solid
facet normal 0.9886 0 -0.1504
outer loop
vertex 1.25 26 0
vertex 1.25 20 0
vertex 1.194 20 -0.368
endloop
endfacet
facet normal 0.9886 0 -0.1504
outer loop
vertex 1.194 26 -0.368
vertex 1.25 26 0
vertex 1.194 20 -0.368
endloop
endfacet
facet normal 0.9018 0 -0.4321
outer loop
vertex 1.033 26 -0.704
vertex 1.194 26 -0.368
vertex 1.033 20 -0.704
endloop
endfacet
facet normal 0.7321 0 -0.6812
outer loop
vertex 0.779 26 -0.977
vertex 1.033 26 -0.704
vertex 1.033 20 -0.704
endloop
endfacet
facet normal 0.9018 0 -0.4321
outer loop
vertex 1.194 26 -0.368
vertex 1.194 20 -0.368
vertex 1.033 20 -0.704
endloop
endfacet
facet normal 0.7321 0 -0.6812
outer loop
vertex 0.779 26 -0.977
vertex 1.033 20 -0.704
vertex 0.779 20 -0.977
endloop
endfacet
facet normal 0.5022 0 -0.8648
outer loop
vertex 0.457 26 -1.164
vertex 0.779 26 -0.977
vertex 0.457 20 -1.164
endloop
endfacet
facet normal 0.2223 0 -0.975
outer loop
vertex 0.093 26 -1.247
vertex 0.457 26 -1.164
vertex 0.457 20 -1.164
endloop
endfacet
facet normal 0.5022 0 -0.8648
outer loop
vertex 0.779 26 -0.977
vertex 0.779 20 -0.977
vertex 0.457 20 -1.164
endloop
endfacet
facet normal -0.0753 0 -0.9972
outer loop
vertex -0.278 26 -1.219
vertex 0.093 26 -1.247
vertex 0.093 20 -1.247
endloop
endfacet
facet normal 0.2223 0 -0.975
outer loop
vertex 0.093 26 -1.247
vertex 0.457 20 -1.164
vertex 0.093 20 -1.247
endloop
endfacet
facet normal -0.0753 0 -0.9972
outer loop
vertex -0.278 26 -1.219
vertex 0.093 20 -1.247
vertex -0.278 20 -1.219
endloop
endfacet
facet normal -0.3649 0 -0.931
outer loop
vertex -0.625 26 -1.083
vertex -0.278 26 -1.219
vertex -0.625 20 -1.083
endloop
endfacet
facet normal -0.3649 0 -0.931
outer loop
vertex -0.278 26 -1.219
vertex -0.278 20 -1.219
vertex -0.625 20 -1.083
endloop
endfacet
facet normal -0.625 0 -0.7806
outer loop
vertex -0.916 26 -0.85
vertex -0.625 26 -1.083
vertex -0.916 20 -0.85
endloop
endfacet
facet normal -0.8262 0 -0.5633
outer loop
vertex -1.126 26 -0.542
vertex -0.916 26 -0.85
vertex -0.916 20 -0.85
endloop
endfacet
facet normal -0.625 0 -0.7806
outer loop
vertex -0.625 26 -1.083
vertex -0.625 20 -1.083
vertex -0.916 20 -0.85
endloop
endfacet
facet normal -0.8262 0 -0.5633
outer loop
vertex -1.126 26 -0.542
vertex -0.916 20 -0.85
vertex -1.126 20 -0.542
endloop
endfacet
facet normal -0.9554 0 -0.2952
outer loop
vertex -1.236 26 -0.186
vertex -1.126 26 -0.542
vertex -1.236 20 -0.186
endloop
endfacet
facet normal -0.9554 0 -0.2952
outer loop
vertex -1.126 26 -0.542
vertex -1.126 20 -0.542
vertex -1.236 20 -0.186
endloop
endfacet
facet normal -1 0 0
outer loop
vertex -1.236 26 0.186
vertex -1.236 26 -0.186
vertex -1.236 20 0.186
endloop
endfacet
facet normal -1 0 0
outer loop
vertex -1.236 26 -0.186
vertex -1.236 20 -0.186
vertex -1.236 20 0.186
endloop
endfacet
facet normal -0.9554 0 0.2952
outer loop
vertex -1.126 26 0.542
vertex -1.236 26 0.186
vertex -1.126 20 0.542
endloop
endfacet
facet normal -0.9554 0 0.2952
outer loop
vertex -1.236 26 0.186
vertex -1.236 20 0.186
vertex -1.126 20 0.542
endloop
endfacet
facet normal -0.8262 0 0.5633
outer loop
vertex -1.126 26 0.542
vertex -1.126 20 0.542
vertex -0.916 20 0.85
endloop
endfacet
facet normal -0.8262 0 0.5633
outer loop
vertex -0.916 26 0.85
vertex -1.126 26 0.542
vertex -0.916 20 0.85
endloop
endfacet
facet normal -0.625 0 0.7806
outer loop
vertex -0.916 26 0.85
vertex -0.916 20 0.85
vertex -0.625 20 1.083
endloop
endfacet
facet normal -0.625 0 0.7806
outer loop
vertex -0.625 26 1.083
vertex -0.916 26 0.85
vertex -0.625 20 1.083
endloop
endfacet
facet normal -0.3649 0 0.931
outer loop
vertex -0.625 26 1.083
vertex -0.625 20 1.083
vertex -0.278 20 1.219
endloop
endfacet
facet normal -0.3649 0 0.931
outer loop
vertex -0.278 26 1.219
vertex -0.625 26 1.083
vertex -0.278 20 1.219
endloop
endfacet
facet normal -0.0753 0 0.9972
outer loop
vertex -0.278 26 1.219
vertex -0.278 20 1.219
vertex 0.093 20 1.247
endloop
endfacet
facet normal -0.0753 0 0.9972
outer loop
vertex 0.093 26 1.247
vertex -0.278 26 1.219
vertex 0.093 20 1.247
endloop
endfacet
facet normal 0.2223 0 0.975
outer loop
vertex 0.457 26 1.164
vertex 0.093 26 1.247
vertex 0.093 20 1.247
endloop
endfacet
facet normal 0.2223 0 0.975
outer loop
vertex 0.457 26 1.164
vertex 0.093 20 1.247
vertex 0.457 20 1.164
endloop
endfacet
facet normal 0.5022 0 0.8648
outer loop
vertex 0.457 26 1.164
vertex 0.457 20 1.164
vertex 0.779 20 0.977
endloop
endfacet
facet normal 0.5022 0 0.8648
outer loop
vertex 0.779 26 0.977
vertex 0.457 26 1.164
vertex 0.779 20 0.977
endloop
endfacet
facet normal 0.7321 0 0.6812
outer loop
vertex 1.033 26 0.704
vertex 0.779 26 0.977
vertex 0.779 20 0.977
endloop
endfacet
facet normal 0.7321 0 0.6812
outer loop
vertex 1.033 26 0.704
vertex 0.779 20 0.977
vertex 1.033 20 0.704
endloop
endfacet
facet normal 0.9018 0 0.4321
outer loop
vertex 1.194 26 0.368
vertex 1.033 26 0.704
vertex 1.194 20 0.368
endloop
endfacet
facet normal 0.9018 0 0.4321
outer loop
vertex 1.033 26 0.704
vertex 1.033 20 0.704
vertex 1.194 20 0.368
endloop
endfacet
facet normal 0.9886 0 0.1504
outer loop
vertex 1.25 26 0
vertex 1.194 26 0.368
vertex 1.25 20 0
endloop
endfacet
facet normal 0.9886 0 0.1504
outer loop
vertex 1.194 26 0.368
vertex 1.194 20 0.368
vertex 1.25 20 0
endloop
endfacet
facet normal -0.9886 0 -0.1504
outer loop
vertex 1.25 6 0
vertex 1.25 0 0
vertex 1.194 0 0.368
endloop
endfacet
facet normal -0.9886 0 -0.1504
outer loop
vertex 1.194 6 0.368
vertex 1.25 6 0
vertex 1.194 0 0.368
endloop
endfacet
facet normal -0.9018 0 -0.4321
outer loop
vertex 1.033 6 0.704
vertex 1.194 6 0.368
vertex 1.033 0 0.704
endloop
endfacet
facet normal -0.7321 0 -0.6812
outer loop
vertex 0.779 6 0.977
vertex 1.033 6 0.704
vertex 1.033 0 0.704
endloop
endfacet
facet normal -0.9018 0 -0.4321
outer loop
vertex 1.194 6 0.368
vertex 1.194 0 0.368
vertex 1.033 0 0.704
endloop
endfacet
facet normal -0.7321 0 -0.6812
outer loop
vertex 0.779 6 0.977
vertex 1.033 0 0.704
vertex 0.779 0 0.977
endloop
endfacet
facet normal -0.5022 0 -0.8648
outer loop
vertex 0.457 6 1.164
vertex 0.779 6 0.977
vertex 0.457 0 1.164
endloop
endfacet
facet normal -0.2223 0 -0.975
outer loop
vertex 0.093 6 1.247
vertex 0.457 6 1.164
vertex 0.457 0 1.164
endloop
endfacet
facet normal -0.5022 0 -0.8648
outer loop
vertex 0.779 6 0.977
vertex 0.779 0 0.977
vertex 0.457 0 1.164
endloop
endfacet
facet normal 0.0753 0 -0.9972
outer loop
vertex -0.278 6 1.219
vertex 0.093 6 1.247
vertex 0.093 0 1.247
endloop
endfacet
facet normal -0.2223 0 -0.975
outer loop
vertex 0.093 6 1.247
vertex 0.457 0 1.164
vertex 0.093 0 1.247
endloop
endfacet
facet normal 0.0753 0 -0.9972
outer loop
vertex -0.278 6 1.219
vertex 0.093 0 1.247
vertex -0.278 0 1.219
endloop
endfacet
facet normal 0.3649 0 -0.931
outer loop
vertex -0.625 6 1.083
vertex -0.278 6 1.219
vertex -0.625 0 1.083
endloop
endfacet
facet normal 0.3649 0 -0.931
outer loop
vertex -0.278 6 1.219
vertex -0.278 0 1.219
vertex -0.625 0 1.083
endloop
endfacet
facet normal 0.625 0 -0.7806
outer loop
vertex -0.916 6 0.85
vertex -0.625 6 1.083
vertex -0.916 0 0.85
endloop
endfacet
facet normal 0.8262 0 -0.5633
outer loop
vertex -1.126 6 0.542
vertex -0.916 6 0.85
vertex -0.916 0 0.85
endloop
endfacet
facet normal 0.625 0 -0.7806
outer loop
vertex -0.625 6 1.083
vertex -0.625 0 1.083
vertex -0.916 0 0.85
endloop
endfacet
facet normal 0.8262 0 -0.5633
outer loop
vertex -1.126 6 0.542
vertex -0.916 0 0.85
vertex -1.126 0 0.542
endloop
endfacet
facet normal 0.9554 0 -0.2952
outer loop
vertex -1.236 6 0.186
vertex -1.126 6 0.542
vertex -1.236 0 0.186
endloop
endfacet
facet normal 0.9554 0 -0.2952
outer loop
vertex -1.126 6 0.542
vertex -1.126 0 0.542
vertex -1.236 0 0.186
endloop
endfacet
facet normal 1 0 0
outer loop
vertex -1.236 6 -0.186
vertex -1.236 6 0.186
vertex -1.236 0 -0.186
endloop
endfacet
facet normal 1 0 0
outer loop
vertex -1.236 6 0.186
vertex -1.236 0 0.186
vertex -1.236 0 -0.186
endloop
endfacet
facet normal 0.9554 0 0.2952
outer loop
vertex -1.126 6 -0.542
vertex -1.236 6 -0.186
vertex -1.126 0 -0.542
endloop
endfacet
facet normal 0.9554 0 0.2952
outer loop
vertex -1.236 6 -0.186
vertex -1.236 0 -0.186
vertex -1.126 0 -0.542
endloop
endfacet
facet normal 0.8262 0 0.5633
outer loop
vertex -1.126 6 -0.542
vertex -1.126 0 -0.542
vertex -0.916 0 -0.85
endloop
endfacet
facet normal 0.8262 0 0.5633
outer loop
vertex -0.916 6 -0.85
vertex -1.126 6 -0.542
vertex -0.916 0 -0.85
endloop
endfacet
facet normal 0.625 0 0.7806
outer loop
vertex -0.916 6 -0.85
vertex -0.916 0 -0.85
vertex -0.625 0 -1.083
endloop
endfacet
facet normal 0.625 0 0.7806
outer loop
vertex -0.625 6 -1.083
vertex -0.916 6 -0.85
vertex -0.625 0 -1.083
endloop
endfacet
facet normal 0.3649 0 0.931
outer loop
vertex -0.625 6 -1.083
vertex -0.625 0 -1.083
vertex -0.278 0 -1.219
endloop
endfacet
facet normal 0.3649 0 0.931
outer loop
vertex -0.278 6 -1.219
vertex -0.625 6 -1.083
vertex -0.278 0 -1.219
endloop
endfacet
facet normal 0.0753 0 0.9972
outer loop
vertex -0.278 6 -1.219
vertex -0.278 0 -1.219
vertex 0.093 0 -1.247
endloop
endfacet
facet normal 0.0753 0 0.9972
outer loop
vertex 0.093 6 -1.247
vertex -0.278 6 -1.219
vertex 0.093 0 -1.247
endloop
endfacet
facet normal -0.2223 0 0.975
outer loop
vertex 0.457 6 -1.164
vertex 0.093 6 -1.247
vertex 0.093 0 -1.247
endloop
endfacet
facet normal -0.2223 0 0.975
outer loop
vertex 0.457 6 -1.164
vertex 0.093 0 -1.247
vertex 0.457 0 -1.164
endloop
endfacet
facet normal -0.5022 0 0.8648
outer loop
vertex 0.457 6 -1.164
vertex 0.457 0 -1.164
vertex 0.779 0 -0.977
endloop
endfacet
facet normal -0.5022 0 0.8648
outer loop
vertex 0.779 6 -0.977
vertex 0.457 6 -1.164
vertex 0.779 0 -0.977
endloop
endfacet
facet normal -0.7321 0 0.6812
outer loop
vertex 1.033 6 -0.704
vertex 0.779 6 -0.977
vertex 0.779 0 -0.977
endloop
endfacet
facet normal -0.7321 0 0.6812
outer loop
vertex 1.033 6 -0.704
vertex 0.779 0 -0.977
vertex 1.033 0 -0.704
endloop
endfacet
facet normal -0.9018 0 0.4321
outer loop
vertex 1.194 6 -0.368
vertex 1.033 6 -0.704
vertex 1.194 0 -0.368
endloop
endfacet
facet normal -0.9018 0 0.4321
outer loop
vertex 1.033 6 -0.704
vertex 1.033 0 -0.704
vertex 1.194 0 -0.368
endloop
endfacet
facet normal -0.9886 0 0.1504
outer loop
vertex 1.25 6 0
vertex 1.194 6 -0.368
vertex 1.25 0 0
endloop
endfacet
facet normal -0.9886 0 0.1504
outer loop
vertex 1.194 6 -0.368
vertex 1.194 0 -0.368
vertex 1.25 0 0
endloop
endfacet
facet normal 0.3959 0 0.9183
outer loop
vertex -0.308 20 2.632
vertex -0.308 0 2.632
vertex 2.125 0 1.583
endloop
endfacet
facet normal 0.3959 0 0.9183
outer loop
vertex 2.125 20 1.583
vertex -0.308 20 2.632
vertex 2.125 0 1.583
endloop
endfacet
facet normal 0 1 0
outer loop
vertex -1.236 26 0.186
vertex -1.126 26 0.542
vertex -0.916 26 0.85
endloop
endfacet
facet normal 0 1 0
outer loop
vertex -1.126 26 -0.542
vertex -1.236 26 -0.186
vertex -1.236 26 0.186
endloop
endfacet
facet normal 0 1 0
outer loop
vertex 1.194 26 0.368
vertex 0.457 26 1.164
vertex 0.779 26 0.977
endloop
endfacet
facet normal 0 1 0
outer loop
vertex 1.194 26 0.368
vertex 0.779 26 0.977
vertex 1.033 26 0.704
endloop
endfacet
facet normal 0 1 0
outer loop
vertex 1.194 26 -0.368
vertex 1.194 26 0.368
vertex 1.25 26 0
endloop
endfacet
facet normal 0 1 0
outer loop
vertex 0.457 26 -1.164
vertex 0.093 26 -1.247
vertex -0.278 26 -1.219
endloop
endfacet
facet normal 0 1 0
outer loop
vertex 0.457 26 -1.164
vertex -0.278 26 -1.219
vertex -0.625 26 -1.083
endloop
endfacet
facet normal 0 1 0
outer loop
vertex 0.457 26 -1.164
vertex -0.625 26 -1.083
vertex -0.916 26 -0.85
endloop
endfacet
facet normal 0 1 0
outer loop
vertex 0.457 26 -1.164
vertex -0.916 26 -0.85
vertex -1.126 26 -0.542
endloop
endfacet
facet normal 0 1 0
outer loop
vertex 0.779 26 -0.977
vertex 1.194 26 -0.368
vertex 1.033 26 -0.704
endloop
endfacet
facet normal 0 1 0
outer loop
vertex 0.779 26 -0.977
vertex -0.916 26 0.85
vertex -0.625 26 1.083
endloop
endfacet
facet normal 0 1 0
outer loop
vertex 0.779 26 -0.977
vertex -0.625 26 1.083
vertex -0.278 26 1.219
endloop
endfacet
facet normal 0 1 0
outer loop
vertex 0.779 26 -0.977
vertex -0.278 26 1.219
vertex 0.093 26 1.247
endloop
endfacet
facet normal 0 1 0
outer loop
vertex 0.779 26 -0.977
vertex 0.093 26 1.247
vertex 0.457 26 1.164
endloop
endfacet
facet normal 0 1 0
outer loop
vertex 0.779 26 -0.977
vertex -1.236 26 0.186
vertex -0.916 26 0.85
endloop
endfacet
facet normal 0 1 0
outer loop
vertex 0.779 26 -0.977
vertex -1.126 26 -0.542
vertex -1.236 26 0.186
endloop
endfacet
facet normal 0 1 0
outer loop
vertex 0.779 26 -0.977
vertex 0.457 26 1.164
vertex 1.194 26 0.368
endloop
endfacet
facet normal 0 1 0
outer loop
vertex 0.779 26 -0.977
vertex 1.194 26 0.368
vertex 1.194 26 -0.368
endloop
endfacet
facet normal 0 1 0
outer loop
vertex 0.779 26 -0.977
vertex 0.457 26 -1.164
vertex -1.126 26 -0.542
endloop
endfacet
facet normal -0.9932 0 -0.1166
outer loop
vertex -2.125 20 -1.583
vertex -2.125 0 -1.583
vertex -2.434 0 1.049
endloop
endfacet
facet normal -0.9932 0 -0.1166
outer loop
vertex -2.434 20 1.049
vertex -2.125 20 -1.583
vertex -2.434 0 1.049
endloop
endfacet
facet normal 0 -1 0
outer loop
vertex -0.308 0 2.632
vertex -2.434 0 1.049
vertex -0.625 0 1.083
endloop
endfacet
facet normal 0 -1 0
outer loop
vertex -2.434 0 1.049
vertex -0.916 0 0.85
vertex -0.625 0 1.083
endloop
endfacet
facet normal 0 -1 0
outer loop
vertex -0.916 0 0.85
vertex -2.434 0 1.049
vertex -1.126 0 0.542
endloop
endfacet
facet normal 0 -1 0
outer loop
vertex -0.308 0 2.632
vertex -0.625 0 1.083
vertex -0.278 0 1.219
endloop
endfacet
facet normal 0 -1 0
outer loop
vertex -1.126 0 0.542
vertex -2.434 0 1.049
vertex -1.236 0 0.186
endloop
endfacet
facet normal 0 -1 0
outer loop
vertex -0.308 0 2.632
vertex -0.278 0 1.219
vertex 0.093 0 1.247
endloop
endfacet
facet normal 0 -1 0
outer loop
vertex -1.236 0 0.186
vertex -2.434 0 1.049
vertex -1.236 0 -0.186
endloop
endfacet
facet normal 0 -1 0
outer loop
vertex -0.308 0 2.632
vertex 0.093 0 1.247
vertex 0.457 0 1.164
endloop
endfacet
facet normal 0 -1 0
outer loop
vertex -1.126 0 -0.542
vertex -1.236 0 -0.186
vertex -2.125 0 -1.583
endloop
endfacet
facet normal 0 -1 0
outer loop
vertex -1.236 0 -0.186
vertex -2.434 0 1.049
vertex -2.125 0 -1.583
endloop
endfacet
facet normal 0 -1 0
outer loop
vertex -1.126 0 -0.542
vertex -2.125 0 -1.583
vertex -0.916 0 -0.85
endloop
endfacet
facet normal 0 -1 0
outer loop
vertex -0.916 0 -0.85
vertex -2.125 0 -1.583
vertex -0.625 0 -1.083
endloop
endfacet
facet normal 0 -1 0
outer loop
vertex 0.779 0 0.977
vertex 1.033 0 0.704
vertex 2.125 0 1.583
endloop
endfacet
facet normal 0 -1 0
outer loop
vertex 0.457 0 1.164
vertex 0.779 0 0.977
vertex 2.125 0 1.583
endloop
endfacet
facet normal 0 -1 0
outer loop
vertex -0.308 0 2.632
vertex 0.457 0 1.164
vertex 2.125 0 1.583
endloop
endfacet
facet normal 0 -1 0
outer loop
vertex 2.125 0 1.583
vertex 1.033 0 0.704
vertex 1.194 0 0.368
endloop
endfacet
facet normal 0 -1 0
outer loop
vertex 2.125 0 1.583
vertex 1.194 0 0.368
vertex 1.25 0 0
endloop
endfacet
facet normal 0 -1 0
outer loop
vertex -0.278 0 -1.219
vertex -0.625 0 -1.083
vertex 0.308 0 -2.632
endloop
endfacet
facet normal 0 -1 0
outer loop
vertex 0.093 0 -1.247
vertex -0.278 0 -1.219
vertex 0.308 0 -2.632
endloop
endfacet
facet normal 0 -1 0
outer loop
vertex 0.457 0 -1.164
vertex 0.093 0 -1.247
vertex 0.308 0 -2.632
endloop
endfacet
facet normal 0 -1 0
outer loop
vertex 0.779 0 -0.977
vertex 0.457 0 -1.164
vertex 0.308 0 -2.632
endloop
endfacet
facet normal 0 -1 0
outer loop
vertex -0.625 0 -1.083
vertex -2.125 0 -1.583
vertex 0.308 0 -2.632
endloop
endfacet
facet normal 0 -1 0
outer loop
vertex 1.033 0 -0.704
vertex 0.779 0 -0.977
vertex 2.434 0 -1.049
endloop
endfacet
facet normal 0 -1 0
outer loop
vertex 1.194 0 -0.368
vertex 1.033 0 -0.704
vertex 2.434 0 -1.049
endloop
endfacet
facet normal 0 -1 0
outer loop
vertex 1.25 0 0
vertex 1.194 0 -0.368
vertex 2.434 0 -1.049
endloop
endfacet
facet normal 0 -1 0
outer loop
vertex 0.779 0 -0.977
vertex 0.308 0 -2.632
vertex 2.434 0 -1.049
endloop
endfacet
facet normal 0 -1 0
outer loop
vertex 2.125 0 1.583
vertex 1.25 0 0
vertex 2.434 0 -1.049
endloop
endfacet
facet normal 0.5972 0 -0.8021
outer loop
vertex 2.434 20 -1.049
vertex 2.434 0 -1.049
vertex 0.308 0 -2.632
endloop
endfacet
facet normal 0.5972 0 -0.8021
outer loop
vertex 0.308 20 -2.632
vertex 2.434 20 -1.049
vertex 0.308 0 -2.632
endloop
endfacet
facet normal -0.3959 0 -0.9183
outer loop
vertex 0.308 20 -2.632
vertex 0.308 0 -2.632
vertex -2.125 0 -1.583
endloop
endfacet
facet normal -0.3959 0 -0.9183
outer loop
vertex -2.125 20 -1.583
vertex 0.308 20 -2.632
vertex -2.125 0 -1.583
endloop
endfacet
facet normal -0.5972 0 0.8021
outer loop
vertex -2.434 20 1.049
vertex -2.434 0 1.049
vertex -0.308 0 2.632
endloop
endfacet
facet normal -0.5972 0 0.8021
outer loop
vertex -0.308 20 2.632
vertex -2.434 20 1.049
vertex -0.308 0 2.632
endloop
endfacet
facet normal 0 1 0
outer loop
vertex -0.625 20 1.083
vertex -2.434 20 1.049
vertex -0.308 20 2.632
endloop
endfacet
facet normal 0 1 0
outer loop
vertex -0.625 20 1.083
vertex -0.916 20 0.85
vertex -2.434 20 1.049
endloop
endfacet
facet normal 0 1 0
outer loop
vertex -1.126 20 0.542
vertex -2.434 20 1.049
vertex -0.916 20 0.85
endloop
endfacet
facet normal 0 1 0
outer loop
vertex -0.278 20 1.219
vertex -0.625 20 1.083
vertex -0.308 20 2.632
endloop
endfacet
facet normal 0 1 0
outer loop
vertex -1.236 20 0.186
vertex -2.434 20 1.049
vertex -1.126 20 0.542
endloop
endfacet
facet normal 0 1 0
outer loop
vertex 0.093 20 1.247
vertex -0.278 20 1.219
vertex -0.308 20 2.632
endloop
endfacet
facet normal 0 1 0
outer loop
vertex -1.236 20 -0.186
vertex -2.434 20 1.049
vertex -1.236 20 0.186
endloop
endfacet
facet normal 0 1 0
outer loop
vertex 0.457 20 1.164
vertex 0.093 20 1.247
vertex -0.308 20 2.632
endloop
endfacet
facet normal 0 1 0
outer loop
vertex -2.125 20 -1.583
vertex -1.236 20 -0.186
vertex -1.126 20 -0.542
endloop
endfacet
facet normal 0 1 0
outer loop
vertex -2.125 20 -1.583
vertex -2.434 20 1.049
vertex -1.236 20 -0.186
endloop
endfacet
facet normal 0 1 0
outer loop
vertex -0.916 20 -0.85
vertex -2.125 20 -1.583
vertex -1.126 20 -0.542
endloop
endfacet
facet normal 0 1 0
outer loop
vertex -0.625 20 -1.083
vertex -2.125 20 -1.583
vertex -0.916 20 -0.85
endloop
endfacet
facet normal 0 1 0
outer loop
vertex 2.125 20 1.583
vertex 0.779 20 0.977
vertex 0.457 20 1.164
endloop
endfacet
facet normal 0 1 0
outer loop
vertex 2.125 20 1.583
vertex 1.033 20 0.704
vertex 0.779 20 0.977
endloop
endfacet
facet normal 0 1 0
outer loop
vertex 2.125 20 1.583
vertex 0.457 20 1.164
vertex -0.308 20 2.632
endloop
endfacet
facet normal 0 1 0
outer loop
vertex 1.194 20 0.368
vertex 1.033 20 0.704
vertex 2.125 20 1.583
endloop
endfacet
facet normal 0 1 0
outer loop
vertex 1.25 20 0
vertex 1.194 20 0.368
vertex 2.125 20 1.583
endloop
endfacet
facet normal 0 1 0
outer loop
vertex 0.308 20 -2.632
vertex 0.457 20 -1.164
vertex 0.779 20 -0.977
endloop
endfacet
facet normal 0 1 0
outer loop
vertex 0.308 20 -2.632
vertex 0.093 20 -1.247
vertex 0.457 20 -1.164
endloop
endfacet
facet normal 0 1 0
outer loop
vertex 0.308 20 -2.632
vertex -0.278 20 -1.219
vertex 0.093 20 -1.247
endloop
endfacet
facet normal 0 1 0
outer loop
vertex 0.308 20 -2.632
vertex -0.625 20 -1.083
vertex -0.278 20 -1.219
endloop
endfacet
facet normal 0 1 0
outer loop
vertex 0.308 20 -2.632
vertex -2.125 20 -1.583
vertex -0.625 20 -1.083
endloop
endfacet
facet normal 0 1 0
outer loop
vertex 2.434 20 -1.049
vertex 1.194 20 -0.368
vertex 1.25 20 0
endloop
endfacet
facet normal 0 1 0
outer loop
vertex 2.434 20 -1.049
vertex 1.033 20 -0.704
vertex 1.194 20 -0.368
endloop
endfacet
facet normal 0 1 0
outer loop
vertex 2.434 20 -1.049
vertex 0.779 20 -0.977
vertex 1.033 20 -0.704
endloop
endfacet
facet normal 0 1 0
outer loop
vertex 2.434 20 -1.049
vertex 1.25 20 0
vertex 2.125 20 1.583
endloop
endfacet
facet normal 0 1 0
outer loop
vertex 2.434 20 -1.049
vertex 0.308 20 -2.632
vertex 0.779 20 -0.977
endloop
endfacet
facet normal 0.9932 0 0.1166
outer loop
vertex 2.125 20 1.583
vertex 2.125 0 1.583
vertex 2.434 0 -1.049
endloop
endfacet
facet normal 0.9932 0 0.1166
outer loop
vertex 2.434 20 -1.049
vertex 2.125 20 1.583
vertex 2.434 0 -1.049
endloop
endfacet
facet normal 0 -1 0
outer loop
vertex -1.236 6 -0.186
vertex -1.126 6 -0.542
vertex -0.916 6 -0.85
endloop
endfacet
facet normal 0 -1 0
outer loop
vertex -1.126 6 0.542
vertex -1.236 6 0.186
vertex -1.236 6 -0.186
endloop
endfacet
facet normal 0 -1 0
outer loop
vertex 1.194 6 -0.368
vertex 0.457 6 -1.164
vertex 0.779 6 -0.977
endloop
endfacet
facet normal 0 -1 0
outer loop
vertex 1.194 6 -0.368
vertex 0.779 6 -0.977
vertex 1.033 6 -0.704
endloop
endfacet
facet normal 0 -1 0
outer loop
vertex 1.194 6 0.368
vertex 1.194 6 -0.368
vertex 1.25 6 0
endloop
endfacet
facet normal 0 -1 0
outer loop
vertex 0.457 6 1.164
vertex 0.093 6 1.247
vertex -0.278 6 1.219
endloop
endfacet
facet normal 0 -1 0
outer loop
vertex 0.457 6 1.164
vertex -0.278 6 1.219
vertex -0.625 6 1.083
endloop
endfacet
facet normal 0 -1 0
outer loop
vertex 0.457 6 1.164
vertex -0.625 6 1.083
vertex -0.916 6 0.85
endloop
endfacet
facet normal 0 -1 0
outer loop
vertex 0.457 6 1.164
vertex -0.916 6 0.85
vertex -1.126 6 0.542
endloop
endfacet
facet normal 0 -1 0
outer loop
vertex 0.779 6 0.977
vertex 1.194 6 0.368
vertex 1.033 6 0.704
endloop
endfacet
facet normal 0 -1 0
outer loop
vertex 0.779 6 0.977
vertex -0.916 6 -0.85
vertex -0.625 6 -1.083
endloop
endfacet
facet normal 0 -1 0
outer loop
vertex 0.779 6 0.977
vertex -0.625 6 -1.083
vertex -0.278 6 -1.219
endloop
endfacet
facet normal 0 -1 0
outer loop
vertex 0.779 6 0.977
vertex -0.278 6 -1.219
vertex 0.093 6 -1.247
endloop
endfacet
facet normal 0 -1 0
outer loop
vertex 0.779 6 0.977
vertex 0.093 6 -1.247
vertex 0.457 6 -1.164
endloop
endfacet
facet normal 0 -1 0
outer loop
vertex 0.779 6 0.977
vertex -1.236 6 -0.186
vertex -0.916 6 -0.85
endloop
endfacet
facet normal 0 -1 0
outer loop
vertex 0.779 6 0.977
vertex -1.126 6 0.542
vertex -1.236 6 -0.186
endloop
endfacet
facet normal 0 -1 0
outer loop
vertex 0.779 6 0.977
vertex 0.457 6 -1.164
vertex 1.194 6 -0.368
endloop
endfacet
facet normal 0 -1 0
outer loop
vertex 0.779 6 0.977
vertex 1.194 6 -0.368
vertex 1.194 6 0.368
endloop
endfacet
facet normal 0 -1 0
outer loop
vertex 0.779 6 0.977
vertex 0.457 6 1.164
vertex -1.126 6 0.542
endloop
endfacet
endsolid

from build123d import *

# Parameters (mm, degrees)
EXTRUDE_1_DEPTH     = 20
SKETCH_2_R          = 1.25
EXTRUDE_2_DEPTH     = 6
SKETCH_3_R          = 1.25
CUT_EXTRUDE_1_DEPTH = 6


with BuildPart() as part:
    # 草图1 → 凸台-拉伸1 (new body)
    with BuildSketch(Plane(origin=(0, 0, 0), x_dir=(1, 0, 0), z_dir=(0, 1, 0))):
        Polygon((2.125123473, -1.583145674), (2.433606108, 1.048838076), (0.308482635, 2.631983751), (-2.125123473, 1.583145674), (-2.433606108, -1.048838076), (-0.308482635, -2.631983751), align=None)
    extrude(amount=EXTRUDE_1_DEPTH)

    # 草图2 → 凸台-拉伸2 (add)
    with BuildSketch(Plane(origin=(0, 20, 0), x_dir=(1, 0, 0), z_dir=(0, 1, 0))):
        Circle(SKETCH_2_R)
    extrude(amount=EXTRUDE_2_DEPTH)

    # 草图3 → 切除-拉伸1 (cut)
    with BuildSketch(Plane.XZ):
        Circle(SKETCH_3_R)
    extrude(amount=-CUT_EXTRUDE_1_DEPTH, mode=Mode.SUBTRACT)


solid = part.part
